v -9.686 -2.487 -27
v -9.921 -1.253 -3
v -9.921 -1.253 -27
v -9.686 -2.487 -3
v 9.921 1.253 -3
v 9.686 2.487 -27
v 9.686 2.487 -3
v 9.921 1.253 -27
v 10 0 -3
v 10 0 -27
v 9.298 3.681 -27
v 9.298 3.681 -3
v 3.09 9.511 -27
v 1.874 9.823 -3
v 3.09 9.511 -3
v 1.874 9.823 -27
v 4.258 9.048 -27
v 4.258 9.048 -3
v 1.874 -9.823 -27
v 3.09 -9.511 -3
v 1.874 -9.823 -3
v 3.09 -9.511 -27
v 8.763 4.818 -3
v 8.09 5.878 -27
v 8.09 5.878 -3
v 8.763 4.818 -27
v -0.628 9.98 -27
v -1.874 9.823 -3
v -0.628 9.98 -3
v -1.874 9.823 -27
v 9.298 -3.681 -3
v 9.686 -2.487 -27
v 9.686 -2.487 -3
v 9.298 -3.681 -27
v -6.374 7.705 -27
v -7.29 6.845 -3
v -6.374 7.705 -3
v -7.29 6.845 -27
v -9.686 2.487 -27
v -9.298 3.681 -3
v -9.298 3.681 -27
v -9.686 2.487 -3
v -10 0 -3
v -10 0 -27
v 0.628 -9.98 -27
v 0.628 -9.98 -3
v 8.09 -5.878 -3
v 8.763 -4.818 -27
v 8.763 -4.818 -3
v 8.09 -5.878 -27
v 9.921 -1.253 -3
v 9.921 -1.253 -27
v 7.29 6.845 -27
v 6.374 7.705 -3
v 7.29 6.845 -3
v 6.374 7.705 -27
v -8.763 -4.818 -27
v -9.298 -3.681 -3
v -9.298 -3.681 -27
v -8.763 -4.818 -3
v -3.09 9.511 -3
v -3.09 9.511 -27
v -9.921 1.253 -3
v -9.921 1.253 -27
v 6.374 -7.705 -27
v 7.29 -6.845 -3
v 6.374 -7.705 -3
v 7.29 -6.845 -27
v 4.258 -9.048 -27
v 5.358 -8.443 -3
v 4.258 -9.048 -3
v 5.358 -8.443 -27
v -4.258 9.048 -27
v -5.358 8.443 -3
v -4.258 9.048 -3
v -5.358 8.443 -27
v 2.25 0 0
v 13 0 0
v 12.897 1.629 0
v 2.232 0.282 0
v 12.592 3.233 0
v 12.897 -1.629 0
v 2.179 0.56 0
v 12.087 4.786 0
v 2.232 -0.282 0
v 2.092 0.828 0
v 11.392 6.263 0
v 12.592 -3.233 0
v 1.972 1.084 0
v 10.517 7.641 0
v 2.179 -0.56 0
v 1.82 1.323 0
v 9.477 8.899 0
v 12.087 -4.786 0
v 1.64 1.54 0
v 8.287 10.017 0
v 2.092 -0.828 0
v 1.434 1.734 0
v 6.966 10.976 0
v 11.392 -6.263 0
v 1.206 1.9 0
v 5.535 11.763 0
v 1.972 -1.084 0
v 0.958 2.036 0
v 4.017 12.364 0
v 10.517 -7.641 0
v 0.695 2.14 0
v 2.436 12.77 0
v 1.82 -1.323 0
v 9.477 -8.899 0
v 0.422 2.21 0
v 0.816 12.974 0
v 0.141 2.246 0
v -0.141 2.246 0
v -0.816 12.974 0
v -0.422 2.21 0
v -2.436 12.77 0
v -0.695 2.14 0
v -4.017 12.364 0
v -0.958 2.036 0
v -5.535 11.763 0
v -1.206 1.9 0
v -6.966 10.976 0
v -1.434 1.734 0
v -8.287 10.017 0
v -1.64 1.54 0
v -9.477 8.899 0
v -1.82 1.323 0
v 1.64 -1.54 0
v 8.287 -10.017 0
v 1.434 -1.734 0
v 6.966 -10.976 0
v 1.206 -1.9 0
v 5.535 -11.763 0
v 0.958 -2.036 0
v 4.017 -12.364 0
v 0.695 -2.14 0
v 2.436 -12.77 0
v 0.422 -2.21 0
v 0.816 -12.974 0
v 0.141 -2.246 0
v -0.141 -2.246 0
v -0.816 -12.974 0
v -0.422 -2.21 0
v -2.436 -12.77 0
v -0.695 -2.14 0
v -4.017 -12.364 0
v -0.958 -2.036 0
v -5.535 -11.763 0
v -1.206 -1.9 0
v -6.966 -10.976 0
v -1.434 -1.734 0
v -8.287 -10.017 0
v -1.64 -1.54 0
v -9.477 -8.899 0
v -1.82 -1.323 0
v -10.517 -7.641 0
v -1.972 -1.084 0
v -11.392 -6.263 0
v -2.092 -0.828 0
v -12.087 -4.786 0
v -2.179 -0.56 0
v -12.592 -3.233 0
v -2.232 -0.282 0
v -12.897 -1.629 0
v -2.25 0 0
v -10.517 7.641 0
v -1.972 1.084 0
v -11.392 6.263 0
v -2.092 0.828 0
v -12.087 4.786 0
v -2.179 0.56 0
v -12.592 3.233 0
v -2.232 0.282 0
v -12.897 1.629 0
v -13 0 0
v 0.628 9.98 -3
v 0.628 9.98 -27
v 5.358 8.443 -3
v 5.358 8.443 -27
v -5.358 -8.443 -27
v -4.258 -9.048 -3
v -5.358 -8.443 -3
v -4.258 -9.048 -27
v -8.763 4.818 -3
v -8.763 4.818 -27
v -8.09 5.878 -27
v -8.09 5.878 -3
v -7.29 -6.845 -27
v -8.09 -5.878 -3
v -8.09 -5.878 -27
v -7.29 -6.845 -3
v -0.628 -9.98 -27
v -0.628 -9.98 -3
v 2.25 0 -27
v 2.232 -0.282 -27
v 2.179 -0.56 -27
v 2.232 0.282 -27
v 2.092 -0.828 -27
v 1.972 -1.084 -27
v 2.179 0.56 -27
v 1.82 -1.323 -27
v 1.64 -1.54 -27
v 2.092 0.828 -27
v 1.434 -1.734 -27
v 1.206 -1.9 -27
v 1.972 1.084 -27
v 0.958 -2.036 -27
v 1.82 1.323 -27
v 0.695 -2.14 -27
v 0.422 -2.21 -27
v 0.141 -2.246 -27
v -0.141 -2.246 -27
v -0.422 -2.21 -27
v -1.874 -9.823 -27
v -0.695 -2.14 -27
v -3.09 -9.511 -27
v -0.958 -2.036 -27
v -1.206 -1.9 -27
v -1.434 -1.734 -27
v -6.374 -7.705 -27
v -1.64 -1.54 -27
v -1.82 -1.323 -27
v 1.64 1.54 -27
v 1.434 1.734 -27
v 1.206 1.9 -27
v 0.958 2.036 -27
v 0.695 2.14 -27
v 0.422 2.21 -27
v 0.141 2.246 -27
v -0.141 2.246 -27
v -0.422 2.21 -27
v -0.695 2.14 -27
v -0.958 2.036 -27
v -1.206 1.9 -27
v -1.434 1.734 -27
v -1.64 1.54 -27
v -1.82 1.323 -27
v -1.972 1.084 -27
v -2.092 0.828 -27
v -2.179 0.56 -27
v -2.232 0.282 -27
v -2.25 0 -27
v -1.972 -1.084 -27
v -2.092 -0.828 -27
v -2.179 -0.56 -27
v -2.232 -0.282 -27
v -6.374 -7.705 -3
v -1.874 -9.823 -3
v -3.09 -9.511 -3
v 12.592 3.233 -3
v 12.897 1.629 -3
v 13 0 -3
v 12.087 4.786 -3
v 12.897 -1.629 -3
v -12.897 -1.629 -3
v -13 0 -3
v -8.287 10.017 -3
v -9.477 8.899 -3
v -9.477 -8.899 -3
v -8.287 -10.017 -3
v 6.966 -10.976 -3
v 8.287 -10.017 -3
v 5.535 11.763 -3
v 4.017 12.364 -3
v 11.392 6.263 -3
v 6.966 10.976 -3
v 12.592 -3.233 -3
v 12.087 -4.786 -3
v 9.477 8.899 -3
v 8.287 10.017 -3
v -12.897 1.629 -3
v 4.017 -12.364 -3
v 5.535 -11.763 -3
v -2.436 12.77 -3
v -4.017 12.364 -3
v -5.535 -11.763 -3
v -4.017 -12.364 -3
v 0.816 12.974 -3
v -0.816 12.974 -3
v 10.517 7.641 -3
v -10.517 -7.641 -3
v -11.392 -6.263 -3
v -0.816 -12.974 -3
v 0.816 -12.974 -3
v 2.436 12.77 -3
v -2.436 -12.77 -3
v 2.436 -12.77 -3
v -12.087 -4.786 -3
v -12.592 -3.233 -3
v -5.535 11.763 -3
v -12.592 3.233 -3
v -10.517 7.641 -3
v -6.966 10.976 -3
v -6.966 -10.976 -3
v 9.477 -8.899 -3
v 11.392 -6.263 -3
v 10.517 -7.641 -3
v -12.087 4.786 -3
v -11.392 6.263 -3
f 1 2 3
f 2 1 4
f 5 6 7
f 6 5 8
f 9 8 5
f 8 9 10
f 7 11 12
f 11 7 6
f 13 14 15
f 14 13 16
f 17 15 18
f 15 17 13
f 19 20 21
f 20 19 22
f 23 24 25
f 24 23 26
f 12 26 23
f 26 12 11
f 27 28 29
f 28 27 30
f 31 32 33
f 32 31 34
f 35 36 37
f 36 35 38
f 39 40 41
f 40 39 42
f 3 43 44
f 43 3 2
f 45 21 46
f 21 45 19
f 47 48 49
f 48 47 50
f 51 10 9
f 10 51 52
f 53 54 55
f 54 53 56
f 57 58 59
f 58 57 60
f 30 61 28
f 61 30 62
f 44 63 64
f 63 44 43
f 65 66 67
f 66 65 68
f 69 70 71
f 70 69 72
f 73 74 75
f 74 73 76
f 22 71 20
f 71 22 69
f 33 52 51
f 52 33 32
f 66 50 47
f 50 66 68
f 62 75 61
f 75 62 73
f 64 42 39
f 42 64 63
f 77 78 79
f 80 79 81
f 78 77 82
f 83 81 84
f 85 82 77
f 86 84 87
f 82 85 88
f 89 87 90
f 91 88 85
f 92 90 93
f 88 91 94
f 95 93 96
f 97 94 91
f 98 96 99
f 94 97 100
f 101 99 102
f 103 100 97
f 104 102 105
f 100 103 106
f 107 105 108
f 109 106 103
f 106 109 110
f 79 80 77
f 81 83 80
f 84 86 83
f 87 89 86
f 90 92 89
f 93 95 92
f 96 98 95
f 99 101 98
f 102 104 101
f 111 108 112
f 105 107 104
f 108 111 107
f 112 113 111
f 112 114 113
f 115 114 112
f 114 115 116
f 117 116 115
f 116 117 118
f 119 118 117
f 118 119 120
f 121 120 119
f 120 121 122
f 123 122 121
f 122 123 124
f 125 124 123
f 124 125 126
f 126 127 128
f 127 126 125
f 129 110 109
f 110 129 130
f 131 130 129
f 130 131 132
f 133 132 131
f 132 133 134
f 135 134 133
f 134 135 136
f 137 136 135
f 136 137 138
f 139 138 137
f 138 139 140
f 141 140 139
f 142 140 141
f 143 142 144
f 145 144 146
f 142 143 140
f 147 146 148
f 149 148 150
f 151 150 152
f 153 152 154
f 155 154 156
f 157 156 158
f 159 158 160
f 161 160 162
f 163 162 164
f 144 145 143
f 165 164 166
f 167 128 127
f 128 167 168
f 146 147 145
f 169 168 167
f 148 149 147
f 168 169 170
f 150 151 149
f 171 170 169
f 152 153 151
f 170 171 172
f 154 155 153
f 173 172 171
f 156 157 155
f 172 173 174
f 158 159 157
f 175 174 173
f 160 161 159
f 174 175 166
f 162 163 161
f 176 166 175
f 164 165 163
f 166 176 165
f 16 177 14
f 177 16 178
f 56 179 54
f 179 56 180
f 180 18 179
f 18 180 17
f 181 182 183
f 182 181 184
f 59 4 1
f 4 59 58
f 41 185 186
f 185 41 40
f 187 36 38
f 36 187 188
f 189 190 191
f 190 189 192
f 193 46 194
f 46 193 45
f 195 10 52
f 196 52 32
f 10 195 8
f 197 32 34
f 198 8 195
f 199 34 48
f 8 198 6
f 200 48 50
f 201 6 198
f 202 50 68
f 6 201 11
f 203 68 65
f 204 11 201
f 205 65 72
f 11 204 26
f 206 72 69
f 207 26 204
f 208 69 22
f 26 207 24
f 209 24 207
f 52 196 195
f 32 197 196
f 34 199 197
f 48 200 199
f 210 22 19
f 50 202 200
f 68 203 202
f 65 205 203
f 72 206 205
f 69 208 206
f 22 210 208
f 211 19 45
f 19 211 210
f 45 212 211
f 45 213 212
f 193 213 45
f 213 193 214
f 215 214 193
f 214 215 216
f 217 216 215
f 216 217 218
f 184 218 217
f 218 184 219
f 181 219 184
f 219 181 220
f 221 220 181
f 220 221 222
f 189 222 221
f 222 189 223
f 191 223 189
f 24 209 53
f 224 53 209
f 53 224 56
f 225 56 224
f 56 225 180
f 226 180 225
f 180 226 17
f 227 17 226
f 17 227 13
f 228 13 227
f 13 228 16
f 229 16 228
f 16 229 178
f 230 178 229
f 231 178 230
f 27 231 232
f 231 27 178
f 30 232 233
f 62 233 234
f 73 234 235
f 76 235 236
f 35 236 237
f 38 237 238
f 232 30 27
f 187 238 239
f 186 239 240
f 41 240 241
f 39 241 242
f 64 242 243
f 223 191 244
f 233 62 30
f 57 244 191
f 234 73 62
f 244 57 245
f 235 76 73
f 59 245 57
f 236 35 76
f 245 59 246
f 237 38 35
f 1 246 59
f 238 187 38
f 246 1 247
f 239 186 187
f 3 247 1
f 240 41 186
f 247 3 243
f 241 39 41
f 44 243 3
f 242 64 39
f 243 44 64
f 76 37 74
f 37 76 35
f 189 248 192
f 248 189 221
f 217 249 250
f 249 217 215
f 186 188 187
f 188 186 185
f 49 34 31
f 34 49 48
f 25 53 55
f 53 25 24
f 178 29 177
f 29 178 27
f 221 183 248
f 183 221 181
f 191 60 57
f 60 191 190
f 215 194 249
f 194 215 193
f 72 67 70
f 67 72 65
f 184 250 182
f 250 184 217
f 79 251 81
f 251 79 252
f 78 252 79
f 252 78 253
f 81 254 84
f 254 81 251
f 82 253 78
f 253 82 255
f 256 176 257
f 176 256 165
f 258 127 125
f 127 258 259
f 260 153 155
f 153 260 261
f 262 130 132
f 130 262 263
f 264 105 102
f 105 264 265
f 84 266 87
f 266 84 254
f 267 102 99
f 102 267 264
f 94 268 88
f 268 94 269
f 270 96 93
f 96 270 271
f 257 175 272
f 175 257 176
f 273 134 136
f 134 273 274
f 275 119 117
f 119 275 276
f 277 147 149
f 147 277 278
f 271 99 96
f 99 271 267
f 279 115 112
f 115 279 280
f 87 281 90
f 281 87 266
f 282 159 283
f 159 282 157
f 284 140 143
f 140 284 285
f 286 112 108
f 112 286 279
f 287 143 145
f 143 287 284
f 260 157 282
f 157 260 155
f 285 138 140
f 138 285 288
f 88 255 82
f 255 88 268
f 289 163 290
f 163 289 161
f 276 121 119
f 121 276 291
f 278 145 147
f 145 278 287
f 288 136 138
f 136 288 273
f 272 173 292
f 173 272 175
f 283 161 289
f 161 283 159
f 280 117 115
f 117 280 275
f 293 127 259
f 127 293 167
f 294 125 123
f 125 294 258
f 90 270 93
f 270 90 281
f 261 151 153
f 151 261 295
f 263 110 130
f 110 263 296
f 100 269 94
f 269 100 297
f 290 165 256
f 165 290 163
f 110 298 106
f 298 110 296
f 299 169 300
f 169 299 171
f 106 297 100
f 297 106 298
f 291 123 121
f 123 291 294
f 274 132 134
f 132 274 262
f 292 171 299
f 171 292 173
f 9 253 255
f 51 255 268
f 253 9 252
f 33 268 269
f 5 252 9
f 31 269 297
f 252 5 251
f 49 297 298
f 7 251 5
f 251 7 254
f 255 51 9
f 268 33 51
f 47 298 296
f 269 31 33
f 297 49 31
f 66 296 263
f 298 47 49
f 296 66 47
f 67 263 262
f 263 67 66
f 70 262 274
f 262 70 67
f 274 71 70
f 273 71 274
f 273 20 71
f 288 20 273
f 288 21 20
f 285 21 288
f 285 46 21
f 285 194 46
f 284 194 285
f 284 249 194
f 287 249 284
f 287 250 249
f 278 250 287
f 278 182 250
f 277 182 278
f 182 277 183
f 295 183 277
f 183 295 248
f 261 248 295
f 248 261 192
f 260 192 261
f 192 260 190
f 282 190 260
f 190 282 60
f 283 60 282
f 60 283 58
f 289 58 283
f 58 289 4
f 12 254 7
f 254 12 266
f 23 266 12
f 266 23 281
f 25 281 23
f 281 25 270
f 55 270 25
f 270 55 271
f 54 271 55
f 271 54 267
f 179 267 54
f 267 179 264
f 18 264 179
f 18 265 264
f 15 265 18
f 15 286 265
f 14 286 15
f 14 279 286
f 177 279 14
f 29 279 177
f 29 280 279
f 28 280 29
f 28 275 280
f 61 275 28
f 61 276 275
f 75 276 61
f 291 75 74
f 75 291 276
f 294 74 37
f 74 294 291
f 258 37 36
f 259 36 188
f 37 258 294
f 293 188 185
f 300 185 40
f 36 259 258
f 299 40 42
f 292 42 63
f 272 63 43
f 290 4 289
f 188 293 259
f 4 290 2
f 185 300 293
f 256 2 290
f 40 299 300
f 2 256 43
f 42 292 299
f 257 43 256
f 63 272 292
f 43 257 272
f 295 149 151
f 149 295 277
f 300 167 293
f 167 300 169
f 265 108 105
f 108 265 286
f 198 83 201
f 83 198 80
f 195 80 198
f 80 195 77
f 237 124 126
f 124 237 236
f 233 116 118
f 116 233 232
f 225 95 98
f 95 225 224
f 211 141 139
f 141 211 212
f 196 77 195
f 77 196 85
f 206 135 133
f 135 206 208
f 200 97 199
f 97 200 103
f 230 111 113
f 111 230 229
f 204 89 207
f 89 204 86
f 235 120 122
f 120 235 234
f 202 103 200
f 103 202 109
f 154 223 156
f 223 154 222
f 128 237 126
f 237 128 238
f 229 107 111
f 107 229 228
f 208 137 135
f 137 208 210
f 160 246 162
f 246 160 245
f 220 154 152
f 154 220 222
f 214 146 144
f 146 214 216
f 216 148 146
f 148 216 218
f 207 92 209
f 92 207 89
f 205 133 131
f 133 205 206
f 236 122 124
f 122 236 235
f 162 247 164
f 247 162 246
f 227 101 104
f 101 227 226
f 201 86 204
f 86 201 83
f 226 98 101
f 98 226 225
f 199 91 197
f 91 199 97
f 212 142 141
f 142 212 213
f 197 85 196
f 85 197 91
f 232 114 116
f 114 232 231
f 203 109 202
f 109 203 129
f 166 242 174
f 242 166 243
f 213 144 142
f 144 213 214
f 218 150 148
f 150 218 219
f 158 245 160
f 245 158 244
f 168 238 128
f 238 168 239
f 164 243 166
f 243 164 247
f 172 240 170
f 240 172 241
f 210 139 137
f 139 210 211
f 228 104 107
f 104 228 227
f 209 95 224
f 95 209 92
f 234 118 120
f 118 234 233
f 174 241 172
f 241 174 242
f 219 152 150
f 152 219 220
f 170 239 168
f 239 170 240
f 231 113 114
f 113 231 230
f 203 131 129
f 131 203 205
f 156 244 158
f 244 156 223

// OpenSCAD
$fn = 50;


difference() {
	union() {
		translate(v = [0, 0, -27.0000000000]) {
			cylinder(h = 27, r = 10.0000000000);
		}
		translate(v = [0, 0, -3.0000000000]) {
			cylinder(h = 3, r = 13.0000000000);
		}
	}
	union() {
		#translate(v = [0, 0, -27]) {
			cylinder(h = 27, r = 2.2500000000);
		}
	}
}
